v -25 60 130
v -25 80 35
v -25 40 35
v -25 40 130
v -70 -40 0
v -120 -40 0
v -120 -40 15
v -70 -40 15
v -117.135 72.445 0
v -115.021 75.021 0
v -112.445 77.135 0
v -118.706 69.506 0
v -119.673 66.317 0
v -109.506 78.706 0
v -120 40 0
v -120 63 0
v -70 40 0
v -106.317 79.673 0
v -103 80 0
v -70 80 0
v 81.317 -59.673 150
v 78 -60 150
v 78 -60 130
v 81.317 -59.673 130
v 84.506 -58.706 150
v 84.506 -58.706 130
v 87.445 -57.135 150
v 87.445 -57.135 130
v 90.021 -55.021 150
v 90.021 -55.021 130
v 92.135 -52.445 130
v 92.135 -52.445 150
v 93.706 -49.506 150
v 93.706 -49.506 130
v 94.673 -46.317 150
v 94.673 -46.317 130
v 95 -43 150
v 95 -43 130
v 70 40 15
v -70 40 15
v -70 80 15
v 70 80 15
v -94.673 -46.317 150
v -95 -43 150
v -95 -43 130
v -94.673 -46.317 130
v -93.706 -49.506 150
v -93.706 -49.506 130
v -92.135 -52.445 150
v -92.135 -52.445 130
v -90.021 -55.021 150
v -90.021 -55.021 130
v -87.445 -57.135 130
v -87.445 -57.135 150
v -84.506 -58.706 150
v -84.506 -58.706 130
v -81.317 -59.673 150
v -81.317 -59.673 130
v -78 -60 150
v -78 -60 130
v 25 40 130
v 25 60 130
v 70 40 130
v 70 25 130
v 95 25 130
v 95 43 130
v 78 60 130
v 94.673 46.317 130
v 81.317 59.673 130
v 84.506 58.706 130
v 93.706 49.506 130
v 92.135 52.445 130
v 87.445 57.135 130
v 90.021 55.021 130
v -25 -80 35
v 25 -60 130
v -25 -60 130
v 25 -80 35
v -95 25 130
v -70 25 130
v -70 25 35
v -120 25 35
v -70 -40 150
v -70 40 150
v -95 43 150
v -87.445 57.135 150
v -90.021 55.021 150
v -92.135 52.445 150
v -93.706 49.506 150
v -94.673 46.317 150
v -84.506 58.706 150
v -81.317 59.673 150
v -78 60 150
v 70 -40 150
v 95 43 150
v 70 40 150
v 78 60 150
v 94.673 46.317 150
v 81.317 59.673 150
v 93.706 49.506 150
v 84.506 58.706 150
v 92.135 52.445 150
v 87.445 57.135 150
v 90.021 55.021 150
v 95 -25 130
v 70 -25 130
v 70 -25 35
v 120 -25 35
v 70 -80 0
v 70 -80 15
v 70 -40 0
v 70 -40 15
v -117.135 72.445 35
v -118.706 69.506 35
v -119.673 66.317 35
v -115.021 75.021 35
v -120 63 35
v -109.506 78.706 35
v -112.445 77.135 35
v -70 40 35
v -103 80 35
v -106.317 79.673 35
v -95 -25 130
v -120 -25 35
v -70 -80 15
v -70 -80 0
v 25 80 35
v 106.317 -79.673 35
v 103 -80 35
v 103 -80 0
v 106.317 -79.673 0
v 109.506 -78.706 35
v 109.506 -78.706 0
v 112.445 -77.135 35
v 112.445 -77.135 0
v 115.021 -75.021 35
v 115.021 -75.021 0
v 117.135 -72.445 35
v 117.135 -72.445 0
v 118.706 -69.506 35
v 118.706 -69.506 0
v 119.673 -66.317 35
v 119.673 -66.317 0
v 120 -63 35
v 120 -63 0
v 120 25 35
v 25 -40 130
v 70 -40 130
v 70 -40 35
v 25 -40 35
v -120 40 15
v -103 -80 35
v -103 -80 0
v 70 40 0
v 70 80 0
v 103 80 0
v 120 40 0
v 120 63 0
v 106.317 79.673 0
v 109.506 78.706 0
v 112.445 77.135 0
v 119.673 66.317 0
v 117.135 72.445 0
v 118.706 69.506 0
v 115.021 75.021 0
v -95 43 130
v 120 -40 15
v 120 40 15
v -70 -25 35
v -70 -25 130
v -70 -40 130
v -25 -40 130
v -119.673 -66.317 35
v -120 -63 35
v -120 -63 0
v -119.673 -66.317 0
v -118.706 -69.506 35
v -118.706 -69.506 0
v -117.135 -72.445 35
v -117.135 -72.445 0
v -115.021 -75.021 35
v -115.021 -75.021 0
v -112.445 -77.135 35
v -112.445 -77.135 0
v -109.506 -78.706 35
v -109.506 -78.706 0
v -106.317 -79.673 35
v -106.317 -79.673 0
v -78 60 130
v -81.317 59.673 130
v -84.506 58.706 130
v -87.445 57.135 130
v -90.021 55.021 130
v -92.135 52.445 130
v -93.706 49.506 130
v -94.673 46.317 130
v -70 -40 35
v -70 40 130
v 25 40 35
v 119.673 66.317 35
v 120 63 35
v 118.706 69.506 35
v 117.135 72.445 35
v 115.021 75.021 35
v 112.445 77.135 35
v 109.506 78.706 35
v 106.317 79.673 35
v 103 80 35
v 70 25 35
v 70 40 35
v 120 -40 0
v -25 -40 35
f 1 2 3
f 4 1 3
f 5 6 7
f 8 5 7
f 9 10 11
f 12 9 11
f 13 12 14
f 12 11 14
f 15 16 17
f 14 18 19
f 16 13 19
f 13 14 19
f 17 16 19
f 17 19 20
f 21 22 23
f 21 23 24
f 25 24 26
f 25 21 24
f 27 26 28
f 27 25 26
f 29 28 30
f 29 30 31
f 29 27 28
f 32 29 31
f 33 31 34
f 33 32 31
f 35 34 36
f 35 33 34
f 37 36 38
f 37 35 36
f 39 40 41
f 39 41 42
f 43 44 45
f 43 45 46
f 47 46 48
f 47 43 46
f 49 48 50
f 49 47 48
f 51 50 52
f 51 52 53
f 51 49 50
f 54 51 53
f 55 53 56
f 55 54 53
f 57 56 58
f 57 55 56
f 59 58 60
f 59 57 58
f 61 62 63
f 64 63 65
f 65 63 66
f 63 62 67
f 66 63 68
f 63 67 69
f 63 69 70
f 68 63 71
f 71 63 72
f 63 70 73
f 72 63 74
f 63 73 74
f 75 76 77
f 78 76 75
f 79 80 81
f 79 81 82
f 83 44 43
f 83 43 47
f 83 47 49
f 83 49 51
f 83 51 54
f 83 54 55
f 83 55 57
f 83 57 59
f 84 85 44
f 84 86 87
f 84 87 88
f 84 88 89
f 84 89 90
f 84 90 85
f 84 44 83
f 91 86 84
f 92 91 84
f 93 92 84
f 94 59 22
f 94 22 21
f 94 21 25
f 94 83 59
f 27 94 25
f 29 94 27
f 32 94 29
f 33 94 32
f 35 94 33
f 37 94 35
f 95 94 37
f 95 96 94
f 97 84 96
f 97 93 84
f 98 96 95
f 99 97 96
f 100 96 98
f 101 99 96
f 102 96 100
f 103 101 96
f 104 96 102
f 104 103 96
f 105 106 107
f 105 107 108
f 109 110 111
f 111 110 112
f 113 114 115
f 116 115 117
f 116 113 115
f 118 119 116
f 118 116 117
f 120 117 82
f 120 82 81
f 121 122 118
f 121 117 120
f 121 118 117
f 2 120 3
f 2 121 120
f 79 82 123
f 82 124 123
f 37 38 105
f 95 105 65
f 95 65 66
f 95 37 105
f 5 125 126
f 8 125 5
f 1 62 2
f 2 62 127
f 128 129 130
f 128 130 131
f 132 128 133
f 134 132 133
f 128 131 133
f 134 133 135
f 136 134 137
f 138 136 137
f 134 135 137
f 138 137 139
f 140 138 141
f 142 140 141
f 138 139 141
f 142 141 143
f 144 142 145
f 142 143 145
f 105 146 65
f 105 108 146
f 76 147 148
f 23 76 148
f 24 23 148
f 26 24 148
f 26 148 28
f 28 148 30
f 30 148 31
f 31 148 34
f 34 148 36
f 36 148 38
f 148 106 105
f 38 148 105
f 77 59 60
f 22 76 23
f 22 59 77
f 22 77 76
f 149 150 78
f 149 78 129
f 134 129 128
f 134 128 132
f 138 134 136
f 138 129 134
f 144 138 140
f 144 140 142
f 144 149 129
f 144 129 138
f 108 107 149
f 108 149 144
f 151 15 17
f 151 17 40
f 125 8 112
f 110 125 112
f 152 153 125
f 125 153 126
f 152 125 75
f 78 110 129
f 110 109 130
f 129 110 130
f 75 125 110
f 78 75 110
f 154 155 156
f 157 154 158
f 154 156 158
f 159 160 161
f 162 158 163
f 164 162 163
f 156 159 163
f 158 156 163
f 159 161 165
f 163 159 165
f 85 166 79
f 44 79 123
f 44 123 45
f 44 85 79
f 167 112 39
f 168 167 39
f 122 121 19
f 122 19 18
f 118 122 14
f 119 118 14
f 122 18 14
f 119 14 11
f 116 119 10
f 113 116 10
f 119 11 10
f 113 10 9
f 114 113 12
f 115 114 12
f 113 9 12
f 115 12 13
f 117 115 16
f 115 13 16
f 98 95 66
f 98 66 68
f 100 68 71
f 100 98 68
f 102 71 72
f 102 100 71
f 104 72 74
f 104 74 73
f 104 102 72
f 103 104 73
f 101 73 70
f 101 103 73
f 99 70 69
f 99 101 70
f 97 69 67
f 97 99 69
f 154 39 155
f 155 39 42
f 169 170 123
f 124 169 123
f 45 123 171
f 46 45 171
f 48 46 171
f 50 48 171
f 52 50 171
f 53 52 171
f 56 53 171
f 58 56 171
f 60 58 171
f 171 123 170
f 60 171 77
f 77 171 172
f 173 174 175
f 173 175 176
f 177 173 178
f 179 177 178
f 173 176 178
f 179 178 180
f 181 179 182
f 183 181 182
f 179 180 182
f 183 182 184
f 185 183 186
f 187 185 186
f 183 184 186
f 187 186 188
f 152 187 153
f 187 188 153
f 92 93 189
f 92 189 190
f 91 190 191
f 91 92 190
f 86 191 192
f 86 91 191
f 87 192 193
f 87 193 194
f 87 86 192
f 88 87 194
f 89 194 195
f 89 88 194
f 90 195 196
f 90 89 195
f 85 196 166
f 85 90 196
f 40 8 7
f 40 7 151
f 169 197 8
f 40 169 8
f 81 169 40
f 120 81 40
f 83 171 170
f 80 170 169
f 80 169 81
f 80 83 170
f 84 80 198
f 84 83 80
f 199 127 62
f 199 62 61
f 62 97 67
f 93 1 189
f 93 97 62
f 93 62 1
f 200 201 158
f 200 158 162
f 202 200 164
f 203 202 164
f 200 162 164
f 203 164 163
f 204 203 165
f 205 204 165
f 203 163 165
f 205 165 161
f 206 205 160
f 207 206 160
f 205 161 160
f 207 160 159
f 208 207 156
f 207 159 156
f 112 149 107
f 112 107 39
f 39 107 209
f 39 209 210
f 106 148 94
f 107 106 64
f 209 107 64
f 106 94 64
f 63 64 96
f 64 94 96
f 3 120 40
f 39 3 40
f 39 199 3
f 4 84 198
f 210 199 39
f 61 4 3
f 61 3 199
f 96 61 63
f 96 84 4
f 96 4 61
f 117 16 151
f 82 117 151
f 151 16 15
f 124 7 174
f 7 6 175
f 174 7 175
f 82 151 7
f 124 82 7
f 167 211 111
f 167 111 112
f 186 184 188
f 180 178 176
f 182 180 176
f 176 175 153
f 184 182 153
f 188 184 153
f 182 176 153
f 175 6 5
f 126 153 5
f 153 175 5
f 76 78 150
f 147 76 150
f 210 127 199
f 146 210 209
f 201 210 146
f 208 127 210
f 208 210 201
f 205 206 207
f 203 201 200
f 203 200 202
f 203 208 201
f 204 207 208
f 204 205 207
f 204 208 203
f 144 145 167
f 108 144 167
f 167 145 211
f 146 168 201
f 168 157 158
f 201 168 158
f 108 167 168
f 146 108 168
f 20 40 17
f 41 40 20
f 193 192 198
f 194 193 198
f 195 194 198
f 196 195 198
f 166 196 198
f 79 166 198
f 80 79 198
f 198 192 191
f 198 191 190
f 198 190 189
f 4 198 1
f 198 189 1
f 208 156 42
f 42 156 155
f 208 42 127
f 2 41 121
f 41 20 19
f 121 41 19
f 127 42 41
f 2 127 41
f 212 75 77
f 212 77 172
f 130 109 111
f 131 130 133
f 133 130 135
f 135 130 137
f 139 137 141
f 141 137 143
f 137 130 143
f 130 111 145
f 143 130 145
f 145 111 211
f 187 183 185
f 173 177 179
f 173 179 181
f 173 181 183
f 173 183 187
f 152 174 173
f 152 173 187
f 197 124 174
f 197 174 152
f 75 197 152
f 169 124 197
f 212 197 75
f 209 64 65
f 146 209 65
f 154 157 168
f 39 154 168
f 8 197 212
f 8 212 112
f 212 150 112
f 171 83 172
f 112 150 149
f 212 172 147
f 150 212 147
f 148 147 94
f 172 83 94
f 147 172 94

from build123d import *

# Parameters (mm, degrees)
PAD_DEPTH            = 35
PAD001_DEPTH         = 20
SKETCH002_W          = 140
SKETCH002_H          = 80
POCKET_DEPTH         = 150.001
PAD002_DEPTH         = 25
PAD003_DEPTH         = 25
SKETCH006_W          = 140
SKETCH006_H          = 15
POCKET001_DEPTH      = 80.001
POCKET001_DEPTH_BACK = -80.001
SKETCH007_W          = 80
SKETCH007_H          = 15
POCKET002_DEPTH      = 120.001
POCKET002_DEPTH_BACK = -120.001


with BuildPart() as part:
    # Sketch (on XY_Plane of Origin) → Pad (new body)
    with BuildSketch(Plane.XY):
        with BuildLine():
            Line((-120, 63), (-120, -63))
            ThreePointArc((-120, -63), (-115.020815, -75.020815), (-103, -80))
            Line((-103, -80), (103, -80))
            ThreePointArc((103, -80), (115.020815, -75.020815), (120, -63))
            Line((120, -63), (120, 63))
            ThreePointArc((120, 63), (115.020815, 75.020815), (103, 80))
            Line((103, 80), (-103, 80))
            ThreePointArc((-103, 80), (-115.020815, 75.020815), (-120, 63))
        make_face()
    extrude(amount=PAD_DEPTH)

    # Sketch001 (on XY_Plane of Origin) → Pad001 (join)
    with BuildSketch(Plane.XY.offset(150)):
        with BuildLine():
            Line((-95, 43), (-95, -43))
            ThreePointArc((-95, -43), (-90.020815, -55.020815), (-78, -60))
            Line((-78, -60), (78, -60))
            ThreePointArc((78, -60), (90.020815, -55.020815), (95, -43))
            Line((95, -43), (95, 43))
            ThreePointArc((95, 43), (90.020815, 55.020815), (78, 60))
            Line((78, 60), (-78, 60))
            ThreePointArc((-78, 60), (-90.020815, 55.020815), (-95, 43))
        make_face()
    extrude(amount=-PAD001_DEPTH)

    # Sketch002 (on Face19 of Pad001) → Pocket (cut, through all)
    with BuildSketch(Plane.XY.offset(150)):
        Rectangle(SKETCH002_W, SKETCH002_H)
    extrude(amount=-POCKET_DEPTH, mode=Mode.SUBTRACT)

    # Sketch003 (on YZ_Plane of Origin) → Pad002 (join, symmetric)
    with BuildSketch(Plane.YZ):
        Polygon((-60, 130), (-80, 35), (-40, 35), (-40, 130), align=None)
    pad002 = extrude(amount=PAD002_DEPTH, both=True)

    # Mirrored: Pad002 across Sketch003 V_Axis
    add(pad002.mirror(Plane(origin=(0, 0, 0), x_dir=(1, 0, 0), z_dir=(0, 1, 0))))

    # Sketch005 (on XZ_Plane of Origin) → Pad003 (join, symmetric)
    with BuildSketch(Plane.XZ):
        Polygon((-70, 130), (-70, 35), (-120, 35), (-95, 130), align=None)
    pad003 = extrude(amount=PAD003_DEPTH, both=True)

    # Mirrored001: Pad003 across Sketch005 V_Axis
    add(pad003.mirror(Plane(origin=(0, 0, 0), x_dir=(0, -1, 0), z_dir=(1, 0, 0))))

    # Sketch006 (on XZ_Plane of Origin) → Pocket001 (cut, two sides)
    with BuildSketch(Plane.XZ) as pocket001_sk:
        with Locations((0, 7.5)):
            Rectangle(SKETCH006_W, SKETCH006_H)
    extrude(amount=-POCKET001_DEPTH, mode=Mode.SUBTRACT)
    extrude(pocket001_sk.sketch, amount=-POCKET001_DEPTH_BACK, mode=Mode.SUBTRACT)

    # Sketch007 (on YZ_Plane of Origin) → Pocket002 (cut, two sides)
    with BuildSketch(Plane.YZ) as pocket002_sk:
        with Locations((0, 7.5)):
            Rectangle(SKETCH007_W, SKETCH007_H)
    extrude(amount=-POCKET002_DEPTH, mode=Mode.SUBTRACT)
    extrude(pocket002_sk.sketch, amount=-POCKET002_DEPTH_BACK, mode=Mode.SUBTRACT)


solid = part.part
